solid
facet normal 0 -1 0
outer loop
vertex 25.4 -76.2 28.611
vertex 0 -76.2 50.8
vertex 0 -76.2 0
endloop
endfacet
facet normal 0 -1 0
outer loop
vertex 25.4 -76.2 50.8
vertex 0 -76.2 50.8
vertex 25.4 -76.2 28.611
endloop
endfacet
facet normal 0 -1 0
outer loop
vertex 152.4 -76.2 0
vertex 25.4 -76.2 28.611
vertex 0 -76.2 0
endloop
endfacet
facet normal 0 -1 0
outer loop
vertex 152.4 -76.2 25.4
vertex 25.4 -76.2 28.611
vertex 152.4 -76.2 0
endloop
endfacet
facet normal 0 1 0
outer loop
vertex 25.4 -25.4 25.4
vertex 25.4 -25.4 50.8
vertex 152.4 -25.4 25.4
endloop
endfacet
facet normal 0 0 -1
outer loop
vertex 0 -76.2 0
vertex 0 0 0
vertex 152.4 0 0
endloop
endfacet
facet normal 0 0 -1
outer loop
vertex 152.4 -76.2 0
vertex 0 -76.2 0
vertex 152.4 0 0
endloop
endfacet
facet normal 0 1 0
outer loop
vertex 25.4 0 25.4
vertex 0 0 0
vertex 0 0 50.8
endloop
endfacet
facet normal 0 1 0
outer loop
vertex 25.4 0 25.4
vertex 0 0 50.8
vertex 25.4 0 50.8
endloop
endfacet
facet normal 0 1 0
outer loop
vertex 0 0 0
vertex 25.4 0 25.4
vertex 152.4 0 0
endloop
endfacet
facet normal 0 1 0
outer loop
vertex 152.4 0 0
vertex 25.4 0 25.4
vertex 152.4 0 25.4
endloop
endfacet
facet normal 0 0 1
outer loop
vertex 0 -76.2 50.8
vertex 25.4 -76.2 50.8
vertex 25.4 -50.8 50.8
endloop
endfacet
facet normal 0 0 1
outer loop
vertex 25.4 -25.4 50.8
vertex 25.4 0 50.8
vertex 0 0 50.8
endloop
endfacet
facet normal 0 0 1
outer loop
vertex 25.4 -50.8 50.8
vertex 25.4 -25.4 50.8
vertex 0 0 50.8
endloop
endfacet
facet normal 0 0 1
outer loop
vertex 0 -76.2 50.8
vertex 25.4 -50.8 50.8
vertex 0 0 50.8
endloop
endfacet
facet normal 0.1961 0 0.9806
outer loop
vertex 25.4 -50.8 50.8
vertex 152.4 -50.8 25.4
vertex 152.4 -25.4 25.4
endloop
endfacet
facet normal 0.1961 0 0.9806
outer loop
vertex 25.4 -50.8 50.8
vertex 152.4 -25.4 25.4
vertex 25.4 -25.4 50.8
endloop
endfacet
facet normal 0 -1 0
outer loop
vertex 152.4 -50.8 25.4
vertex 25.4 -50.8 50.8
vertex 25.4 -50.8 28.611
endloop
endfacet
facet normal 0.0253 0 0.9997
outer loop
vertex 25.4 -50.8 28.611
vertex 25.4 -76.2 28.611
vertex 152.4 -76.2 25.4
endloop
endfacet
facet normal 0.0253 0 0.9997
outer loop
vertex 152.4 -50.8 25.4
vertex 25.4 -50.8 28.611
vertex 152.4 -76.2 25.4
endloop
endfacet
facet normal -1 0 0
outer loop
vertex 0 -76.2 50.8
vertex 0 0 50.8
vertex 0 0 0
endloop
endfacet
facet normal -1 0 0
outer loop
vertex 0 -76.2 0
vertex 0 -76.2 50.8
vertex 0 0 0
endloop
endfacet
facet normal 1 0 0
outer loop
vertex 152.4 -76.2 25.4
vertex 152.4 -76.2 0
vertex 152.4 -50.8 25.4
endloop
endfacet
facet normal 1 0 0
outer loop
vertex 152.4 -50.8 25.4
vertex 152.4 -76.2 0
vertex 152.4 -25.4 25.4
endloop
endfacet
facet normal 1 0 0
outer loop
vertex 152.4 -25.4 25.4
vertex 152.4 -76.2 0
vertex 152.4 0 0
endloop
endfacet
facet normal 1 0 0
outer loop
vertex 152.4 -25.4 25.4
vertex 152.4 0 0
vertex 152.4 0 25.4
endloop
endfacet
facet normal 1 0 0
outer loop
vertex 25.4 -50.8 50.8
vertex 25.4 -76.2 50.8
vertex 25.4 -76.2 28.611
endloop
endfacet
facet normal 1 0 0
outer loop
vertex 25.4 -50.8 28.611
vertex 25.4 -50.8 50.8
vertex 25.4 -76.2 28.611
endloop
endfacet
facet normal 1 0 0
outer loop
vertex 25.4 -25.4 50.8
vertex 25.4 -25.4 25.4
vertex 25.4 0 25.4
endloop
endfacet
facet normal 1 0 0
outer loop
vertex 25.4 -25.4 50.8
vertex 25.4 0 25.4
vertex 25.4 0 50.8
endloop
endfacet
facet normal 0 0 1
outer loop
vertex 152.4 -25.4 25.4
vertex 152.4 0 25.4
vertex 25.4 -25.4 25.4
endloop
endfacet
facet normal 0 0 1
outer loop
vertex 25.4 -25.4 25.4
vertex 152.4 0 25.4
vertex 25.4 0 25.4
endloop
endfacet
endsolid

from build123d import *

# Parameters (mm, degrees)
F1_DEPTH = 76.2
F3_DEPTH = 50.8
F5_DEPTH = 25.4


with BuildPart() as f1:
    # F0 (on Front) → F1 (new body)
    with BuildSketch(Plane.XZ):
        Polygon((0, 50.8), (0, 0), (152.4, 0), (152.4, 25.4), (25.4, 25.4), (25.4, 50.8), align=None)
    extrude(amount=F1_DEPTH)

    # F2 (on face) → F3 (join)
    with BuildSketch(Plane.XZ.offset(76.2)):
        Polygon((152.4, 25.4), (25.4, 50.8), (25.4, 25.4), align=None)
    extrude(amount=-F3_DEPTH)

    # F4 (on face) → F5 (cut)
    with BuildSketch(Plane.XZ.offset(76.2)):
        Polygon((152.4, 25.4), (25.4, 50.8), (25.4, 28.610824), align=None)
    extrude(amount=-F5_DEPTH, mode=Mode.SUBTRACT)


solid = f1.part
